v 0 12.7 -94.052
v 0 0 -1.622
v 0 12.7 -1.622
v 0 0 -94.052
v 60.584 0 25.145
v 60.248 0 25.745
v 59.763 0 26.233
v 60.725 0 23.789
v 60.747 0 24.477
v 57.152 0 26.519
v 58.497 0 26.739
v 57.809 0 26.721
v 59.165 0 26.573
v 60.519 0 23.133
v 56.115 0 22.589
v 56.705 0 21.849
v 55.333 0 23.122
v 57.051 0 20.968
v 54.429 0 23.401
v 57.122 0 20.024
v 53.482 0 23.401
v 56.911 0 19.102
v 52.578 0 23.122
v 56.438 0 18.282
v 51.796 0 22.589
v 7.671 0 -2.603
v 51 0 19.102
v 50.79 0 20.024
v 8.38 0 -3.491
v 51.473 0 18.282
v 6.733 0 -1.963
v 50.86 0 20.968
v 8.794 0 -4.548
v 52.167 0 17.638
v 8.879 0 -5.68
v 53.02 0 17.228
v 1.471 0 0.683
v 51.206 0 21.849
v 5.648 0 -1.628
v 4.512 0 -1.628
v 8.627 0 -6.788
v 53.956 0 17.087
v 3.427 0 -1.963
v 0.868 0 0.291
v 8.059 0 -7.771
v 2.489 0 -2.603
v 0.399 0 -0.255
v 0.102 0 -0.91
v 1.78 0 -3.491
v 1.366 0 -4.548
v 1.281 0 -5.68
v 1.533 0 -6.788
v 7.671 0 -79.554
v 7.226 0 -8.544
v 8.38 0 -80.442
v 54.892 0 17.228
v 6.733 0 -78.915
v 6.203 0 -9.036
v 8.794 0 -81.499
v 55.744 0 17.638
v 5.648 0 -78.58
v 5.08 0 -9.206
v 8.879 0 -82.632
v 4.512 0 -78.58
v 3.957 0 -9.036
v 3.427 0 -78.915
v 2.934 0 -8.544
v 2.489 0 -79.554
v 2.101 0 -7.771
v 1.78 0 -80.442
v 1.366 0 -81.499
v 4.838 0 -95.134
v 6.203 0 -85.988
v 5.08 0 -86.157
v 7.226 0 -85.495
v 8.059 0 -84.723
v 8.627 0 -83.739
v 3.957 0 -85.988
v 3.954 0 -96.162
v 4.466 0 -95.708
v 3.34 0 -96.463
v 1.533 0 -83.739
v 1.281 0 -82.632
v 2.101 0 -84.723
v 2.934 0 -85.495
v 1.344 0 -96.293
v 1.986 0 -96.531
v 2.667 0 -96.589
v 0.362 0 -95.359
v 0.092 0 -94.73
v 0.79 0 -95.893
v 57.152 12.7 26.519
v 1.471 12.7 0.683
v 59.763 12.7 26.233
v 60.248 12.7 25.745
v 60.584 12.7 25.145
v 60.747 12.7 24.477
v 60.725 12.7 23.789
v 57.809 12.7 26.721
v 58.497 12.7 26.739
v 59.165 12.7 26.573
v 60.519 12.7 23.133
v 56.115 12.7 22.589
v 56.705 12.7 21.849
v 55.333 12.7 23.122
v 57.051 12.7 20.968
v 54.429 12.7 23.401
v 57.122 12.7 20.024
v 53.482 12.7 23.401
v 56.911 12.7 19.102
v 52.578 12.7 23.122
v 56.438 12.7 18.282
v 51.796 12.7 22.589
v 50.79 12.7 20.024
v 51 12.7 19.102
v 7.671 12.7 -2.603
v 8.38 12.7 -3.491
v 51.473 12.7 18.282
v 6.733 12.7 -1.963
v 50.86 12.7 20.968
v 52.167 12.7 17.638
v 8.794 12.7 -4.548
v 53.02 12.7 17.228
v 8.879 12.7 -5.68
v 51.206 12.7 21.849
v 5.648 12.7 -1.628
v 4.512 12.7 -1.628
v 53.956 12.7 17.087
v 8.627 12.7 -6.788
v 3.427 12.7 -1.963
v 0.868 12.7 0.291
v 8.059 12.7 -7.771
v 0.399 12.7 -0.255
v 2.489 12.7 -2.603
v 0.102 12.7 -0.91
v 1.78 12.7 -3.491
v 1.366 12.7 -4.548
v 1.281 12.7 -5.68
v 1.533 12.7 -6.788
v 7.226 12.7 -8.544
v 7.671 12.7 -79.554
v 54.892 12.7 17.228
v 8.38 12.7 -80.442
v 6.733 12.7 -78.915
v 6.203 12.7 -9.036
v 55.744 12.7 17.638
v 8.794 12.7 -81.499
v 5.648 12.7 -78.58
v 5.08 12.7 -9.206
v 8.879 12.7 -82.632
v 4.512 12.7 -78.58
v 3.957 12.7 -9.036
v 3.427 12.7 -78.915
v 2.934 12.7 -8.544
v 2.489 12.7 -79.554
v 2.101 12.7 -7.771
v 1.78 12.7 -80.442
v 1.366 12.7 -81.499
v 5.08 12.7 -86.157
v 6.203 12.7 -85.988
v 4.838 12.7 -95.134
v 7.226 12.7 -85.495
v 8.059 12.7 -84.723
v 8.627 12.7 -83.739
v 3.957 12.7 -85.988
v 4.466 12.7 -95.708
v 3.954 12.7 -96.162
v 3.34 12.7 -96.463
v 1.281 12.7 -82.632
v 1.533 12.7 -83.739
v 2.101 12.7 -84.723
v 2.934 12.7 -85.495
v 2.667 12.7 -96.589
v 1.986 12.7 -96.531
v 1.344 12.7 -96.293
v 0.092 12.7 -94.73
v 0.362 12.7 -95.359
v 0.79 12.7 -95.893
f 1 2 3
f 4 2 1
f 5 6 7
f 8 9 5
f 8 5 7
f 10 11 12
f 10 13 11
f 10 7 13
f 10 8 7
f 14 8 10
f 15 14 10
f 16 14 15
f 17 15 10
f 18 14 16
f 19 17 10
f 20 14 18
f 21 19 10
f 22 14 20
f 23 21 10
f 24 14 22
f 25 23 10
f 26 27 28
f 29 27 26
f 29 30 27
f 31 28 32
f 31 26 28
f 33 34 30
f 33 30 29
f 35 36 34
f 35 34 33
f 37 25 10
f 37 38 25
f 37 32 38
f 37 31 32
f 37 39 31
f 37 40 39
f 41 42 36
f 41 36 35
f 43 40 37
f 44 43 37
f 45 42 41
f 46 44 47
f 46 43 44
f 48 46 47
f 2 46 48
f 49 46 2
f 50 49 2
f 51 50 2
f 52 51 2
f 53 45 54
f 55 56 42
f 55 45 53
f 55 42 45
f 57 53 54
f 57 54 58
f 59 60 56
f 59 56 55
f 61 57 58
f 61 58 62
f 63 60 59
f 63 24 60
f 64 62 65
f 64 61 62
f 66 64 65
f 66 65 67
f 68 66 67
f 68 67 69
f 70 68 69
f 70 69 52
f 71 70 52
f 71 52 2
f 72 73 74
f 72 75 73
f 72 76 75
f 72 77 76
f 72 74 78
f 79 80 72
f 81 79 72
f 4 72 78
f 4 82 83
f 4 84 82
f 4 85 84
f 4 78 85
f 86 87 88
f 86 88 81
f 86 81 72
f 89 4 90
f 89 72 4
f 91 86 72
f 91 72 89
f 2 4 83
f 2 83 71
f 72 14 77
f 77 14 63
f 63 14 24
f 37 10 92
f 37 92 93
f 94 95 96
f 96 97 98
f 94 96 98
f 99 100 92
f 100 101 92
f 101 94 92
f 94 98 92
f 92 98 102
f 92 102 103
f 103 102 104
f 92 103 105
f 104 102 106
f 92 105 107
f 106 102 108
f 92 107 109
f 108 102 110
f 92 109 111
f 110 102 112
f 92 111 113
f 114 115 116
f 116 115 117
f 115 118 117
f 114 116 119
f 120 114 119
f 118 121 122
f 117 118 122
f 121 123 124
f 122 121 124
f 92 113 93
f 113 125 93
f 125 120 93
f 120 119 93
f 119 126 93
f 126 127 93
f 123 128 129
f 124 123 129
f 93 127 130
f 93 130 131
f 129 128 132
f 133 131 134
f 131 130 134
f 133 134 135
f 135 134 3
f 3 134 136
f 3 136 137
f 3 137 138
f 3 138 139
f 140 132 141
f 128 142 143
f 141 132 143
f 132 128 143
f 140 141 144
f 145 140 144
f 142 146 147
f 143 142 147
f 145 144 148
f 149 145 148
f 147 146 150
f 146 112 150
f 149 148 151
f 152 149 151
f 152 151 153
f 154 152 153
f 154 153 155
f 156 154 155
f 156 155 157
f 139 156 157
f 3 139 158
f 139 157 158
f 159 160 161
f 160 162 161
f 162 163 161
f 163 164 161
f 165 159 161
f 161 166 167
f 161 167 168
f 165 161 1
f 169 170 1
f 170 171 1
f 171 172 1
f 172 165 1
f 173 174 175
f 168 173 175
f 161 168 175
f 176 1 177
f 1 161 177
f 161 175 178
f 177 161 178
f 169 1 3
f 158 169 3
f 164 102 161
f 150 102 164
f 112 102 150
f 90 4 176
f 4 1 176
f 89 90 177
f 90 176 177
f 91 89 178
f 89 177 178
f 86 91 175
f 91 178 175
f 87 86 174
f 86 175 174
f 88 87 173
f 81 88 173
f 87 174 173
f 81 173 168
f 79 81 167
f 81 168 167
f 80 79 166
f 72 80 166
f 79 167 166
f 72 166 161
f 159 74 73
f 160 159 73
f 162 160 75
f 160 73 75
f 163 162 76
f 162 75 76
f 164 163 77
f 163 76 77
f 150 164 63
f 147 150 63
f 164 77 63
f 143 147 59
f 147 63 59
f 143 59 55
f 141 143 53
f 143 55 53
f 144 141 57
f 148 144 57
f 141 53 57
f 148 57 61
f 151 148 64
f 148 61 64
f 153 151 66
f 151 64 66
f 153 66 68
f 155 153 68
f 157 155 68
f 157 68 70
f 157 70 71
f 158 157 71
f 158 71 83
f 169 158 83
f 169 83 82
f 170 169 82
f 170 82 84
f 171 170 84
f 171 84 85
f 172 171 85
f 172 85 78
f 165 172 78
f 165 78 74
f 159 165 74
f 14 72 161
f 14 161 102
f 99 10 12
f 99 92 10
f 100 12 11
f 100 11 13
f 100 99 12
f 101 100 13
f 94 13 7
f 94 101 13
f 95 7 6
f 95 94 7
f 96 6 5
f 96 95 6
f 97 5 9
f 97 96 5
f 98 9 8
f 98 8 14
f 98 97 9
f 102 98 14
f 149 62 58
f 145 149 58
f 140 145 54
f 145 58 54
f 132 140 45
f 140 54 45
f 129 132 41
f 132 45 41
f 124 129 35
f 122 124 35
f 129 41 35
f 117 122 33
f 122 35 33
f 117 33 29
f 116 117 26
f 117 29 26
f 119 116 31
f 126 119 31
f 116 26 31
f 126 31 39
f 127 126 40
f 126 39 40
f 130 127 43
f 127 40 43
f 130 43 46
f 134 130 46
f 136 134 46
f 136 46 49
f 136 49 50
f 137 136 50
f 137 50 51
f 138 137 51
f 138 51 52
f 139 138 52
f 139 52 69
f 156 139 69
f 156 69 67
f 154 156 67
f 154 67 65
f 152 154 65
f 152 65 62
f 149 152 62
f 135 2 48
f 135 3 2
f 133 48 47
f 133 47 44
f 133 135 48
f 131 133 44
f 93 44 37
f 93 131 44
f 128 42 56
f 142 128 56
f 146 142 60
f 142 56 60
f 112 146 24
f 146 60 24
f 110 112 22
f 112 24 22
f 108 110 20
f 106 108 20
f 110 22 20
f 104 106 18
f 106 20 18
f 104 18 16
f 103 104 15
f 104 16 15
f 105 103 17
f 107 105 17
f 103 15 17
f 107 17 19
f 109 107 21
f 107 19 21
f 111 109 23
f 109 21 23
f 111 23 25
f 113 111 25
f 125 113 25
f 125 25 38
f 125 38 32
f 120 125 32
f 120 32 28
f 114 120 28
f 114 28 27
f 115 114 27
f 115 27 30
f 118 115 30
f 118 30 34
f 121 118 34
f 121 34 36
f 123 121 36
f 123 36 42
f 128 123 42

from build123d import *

# Parameters (mm, degrees)
BOSS_EXTRUDE1_DEPTH = 12.7
SKETCH2_R           = 3.81
SKETCH2_R_2         = 3.175
CUT_EXTRUDE1_DEPTH  = 124.712602834
FILLET1_R           = 2.54


with BuildPart() as part:
    # Sketch1 → Boss-Extrude1 (new body)
    with BuildSketch(Plane(origin=(0, 0, 0), x_dir=(1, 0, 0), z_dir=(0, 1, 0))):
        Polygon((0, 0), (0, 105.41), (63.5, -29.464), align=None)
    extrude(amount=BOSS_EXTRUDE1_DEPTH)

    # Sketch2 → Cut-Extrude1 (cut, through all)
    with BuildSketch(Plane.XZ):
        with Locations(Location((5.08, -82.347196418, 0), (0, 0, 270))):
            Circle(SKETCH2_R)
        with Locations(Location((5.08, -5.39556681, 0), (0, 0, 270))):
            Circle(SKETCH2_R)
        with Locations(Location((53.955653889, 20.261534242, 0), (0, 0, 270))):
            Circle(SKETCH2_R_2)
    extrude(amount=-CUT_EXTRUDE1_DEPTH, mode=Mode.SUBTRACT)

    # Fillet1
    fillet1_edges = [part.edges().sort_by_distance(p)[0] for p in [
        (0, 6.35, 0),
        (0, 6.35, -105.41),
        (63.5, 6.35, 29.464),
    ]]
    fillet(fillet1_edges, radius=FILLET1_R)


solid = part.part
